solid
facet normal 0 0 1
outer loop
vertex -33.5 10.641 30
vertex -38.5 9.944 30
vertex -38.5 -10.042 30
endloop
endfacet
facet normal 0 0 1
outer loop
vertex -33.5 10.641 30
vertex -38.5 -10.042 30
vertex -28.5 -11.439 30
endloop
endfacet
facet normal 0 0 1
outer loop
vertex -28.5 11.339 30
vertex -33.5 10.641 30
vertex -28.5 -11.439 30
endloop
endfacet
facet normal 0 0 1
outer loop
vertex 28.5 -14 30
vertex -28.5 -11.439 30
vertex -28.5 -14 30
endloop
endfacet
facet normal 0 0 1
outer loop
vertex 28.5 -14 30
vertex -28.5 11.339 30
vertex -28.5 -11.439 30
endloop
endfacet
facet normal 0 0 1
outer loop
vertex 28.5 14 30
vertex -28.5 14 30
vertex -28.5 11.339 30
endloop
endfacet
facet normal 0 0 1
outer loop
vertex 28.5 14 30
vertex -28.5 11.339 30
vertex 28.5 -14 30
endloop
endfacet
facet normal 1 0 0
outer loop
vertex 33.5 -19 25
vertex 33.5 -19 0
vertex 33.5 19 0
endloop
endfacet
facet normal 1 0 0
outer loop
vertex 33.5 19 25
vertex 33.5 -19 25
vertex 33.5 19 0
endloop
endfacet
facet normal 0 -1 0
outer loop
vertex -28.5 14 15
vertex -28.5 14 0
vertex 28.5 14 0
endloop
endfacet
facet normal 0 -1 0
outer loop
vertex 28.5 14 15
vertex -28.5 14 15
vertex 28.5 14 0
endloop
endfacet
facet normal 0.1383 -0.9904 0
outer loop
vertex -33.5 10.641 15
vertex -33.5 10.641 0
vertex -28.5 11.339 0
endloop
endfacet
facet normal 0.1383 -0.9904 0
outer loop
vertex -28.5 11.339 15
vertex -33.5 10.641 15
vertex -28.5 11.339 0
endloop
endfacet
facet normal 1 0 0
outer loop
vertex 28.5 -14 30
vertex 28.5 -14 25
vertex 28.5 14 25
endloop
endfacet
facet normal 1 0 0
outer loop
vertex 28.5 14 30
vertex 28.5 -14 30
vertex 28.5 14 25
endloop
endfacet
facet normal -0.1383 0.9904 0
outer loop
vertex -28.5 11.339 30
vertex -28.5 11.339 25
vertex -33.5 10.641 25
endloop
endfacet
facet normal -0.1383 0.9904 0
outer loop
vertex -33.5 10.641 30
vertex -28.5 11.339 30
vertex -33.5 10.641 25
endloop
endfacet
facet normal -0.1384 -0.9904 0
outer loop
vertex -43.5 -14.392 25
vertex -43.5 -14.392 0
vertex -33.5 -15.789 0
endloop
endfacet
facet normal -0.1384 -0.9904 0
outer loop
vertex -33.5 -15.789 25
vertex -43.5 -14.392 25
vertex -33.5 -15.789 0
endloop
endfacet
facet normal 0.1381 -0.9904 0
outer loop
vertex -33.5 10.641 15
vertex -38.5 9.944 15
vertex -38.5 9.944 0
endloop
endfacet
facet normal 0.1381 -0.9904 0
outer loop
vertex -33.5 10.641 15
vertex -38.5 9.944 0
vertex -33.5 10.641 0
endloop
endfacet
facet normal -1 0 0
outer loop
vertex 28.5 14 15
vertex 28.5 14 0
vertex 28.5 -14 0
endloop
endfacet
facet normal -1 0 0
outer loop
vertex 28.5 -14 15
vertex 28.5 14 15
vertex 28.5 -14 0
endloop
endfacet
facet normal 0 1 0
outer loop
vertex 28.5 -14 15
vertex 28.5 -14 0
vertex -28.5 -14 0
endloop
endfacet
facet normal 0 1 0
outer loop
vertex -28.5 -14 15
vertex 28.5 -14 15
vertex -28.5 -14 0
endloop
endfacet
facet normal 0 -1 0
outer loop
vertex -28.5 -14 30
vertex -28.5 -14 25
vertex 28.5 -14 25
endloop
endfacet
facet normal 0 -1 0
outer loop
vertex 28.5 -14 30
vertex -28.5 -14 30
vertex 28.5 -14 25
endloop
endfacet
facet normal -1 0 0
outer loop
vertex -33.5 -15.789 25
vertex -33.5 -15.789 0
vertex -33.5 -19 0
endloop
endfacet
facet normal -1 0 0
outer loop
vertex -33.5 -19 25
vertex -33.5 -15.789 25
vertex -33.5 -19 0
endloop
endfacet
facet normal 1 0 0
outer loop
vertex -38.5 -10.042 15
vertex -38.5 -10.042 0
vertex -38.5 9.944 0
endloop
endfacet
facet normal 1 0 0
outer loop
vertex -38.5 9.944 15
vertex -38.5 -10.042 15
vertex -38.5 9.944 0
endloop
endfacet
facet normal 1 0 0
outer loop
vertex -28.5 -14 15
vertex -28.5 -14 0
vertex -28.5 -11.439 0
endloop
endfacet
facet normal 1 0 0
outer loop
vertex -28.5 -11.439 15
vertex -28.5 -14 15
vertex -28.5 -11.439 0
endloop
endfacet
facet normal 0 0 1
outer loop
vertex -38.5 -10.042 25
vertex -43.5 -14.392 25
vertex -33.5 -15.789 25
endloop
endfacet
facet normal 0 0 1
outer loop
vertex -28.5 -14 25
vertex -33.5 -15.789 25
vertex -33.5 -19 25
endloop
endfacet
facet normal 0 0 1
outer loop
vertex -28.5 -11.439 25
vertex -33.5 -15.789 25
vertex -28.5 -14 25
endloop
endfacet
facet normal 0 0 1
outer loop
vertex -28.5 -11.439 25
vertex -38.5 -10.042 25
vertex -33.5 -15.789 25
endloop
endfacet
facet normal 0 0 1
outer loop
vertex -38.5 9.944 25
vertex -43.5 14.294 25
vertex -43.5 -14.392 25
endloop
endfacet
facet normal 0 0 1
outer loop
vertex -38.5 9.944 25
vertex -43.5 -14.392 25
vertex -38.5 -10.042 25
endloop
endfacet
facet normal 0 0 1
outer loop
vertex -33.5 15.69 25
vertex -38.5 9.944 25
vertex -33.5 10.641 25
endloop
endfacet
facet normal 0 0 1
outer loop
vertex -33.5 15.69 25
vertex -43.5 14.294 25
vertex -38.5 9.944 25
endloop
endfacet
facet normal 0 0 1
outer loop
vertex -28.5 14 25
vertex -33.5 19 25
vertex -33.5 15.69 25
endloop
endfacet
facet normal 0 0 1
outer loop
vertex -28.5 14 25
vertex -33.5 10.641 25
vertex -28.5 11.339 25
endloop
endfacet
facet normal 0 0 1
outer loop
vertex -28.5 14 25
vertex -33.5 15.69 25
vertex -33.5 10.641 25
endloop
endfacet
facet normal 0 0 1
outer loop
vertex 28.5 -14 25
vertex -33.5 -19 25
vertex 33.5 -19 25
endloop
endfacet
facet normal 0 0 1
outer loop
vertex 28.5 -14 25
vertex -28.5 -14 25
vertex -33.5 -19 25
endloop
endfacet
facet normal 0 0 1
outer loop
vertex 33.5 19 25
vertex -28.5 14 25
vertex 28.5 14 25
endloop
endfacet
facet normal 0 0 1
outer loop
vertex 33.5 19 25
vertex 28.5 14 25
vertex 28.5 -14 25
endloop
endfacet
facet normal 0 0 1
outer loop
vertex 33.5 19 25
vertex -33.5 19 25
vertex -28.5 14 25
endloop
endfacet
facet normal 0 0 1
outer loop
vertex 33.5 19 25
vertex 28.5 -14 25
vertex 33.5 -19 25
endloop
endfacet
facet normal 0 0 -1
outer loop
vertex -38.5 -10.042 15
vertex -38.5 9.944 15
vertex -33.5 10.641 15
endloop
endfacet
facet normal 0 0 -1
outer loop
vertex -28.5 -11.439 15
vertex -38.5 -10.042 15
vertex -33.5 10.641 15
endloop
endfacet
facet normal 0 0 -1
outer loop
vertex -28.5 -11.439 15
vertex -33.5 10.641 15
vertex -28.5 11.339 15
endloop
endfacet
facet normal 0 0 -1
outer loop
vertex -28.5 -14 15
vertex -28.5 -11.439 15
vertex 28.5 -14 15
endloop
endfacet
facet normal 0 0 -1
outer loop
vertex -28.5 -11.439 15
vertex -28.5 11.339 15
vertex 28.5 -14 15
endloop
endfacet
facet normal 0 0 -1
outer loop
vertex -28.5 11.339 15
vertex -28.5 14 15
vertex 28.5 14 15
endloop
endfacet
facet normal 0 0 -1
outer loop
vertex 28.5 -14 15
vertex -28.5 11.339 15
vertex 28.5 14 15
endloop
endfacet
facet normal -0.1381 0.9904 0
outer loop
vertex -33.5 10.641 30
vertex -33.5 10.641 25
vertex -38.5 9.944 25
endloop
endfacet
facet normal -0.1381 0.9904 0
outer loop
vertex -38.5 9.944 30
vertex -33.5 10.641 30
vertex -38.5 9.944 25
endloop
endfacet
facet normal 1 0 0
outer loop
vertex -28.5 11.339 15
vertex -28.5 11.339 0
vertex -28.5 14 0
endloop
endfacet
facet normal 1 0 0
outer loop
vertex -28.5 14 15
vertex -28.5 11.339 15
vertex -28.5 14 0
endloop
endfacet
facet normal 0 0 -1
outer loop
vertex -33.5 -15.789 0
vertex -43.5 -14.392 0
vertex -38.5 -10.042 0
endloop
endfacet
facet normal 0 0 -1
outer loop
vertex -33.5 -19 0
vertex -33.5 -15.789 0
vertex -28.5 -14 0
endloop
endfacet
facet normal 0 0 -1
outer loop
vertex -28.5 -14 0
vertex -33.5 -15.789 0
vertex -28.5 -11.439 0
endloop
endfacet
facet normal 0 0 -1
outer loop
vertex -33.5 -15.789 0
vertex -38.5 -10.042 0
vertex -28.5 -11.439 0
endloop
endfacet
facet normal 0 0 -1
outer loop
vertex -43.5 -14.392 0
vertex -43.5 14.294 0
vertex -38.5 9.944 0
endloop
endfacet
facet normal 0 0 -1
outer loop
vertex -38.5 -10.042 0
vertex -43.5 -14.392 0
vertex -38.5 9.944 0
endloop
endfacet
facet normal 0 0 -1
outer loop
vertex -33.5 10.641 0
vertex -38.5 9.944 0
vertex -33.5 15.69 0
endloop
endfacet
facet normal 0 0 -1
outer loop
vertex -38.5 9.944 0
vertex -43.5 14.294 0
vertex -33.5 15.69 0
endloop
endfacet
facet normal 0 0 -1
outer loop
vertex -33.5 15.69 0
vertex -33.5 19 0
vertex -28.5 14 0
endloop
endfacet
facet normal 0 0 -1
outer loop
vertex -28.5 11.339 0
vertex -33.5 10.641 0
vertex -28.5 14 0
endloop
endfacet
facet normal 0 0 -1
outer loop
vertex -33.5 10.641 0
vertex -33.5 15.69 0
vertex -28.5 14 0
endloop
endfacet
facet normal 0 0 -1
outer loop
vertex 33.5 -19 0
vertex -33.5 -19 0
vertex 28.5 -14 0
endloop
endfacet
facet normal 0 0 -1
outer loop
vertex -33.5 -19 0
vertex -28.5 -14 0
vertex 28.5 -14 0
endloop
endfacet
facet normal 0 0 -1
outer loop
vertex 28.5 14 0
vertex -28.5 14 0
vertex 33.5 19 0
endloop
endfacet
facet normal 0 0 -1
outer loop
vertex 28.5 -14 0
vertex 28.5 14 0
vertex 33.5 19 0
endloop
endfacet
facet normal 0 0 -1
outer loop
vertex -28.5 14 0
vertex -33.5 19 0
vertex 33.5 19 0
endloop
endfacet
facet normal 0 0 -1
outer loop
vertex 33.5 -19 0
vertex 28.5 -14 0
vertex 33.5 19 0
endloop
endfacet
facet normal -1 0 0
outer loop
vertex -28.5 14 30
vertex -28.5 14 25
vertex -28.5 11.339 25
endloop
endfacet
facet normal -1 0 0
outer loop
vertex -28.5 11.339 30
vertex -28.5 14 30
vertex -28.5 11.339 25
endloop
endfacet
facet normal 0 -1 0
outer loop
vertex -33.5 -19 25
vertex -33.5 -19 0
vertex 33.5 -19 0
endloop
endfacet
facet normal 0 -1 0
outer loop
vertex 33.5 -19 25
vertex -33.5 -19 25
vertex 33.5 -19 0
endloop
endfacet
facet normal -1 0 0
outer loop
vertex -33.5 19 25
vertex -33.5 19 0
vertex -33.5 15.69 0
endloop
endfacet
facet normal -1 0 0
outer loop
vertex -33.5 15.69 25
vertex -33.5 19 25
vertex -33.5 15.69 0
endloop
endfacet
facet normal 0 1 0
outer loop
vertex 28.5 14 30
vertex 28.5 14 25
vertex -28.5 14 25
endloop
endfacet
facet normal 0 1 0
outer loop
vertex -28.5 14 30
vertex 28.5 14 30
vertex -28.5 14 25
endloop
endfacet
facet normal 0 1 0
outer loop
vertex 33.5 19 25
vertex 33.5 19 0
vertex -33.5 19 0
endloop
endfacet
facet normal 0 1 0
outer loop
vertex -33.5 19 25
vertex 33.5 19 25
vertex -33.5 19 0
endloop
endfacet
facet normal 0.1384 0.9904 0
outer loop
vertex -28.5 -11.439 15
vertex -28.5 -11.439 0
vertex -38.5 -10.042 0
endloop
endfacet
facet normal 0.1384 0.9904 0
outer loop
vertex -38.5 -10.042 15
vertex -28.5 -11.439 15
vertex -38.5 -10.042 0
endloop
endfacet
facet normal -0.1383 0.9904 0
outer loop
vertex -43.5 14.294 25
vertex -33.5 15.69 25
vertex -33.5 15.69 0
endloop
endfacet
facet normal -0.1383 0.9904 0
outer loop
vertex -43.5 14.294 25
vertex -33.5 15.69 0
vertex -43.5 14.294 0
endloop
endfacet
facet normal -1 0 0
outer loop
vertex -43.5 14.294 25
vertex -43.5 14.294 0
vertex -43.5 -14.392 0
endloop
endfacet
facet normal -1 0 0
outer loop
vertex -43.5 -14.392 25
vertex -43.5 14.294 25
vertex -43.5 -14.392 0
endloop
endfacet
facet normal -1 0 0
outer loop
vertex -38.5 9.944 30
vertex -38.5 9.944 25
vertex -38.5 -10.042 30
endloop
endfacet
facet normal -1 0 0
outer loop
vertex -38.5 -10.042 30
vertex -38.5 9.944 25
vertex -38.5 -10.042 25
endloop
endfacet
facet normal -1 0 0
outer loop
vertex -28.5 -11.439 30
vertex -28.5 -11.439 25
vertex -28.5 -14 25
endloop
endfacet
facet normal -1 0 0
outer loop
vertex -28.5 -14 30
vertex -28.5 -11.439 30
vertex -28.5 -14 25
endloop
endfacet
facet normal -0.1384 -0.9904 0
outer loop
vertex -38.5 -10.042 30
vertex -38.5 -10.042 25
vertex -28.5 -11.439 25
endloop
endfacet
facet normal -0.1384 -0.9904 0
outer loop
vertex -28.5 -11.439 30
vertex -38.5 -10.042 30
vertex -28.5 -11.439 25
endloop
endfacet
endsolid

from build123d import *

# Parameters (mm, degrees)
F1_START = 15
F1_DEPTH = 15
F2_DEPTH = 25


with BuildPart() as f1:
    # F0 (on Top) → F1 (new body)
    with BuildSketch(Plane.XY.offset(F1_START)):
        Polygon((28.5, -14), (28.5, 14), (-28.5, 14), (-28.5, 11.3388504833), (-28.5, -11.4388540387), (-28.5, -14), align=None)
        Polygon((-28.5, -11.4388540387), (-28.5, 11.3388504833), (-33.5, 10.6412195601), (-33.5, -10.740224272), align=None)
        Polygon((-33.5, -10.740224272), (-33.5, 10.6412195601), (-38.5, 9.9435886368), (-38.5, -10.0415945053), align=None)
    extrude(amount=F1_DEPTH)

    # F0 (on Top) → F2 (join)
    with BuildSketch(Plane.XY):
        Polygon((-38.5, 9.9435886368), (-33.5, 10.6412195601), (-33.5, 15.6896538624), (-43.5, 14.2943920159), (-43.5, -14.3915371656), (-33.5, -15.788796699), (-33.5, -10.740224272), (-38.5, -10.0415945053), align=None)
        Polygon((-28.5, 14), (28.5, 14), (28.5, -14), (-28.5, -14), (-28.5, -11.4388540387), (-33.5, -10.740224272), (-33.5, -15.788796699), (-33.5, -19), (33.5, -19), (33.5, 19), (-33.5, 19), (-33.5, 15.6896538624), (-33.5, 10.6412195601), (-28.5, 11.3388504833), align=None)
    extrude(amount=F2_DEPTH)


solid = f1.part
